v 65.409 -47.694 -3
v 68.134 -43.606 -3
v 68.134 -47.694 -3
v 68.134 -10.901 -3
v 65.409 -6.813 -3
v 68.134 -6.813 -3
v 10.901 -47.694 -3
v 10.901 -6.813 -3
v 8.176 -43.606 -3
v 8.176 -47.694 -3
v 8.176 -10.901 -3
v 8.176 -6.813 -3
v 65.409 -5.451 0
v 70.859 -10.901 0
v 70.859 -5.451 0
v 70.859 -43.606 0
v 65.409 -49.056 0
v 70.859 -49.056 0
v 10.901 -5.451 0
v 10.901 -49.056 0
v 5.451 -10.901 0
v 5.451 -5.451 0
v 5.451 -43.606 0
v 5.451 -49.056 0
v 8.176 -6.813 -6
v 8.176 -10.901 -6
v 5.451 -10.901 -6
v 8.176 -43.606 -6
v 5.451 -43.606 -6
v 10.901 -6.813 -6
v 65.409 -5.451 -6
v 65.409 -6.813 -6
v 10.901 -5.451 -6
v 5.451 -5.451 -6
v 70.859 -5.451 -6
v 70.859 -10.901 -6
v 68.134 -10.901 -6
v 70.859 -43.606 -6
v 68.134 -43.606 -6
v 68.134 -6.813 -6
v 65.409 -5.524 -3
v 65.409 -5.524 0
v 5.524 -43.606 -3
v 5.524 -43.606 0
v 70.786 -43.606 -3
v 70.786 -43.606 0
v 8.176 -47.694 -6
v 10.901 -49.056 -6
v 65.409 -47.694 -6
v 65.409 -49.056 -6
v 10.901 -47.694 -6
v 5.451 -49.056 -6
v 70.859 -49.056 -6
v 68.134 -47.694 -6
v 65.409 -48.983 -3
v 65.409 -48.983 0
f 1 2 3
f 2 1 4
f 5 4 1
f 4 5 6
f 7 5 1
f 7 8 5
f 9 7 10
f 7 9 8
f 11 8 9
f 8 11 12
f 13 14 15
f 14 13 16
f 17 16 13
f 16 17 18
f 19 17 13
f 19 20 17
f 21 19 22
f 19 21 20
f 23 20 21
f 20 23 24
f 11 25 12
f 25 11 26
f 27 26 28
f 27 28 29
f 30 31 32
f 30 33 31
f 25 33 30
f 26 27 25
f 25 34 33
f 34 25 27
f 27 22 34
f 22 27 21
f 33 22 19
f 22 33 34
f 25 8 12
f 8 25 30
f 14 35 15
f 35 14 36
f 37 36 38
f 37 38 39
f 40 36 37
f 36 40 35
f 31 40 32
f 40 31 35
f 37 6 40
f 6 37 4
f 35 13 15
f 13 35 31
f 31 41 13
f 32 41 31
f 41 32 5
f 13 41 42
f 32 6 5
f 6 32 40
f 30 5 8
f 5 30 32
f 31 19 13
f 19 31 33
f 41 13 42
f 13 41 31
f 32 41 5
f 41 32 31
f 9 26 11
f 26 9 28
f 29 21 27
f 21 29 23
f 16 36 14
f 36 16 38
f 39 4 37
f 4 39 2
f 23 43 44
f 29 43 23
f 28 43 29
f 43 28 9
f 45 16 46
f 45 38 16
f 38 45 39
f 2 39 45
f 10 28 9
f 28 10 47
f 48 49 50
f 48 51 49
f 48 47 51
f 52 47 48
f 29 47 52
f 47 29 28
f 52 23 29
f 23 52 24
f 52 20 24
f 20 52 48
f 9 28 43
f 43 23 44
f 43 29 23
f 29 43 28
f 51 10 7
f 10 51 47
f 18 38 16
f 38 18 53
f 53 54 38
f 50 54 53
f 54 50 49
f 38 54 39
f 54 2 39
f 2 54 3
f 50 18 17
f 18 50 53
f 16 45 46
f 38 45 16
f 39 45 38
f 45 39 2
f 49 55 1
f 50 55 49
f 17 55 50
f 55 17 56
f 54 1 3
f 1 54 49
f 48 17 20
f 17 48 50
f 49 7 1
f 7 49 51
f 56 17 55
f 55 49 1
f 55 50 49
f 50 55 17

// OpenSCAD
/*
PENTOMINO BLOCKS GENERATOR
==========================
(C) 2017 by Pascal Bauermeister.

(This is a part of the project "Pentomino Belt Buckle", focused on the
Pentomino pieces. It can however be used standalone. The other parts, not in this
file, include: frame, belt clip.)

This OpenSCAD script generates Pentomino blocks, with tabs and cavities to
allow them to hold together.

Being completely parametric allows individual control such as:
- size and thickness,
- tolerances (important for 3D printing), and also
- creating any kind of pieces, including 2D Polyminos of N cells for any N.

This is freeware. Enjoy and modify freely. You may kindly mention this project.
*/

IS_FRAME = true;
SCALE_FACTOR = IS_FRAME ? (60 - 1.3) / 60 : 1; // makes frame a bit smaller, compensating pentominos tolerance
//SCALE_FACTOR = IS_FRAME ? (60 - 1.8 + 0.5) / 60 : 1; // makes frame a bit smaller, compensating pentominos tolerance
echo("SCALE_FACTOR=", SCALE_FACTOR);

IS_INV = 1;

$fn = 24; // 24: high quality; 8: draft
//$fn = 8;
$fn = 16;

// BASE ETCHING
// this etches the first layer, to compensate for being wider due to being squished down
BASE_HEIGHT = 0.3;
BASE_TOLERANCE = 0.3;

// BLOCK
BLOCK_TOLERANCE = 0.15/2; // in mm
GRIP_TOLERANCE = 0.15/2; // in mm

BLOCK_SIDE = 6.5 *6/7;       // in mm
BLOCK_HEIGHT = 3;     // in mm
echo("BLOCK_SIDE=", BLOCK_SIDE);

DH = 0.1;
// GRIP
GRIP_RADIUS = BLOCK_HEIGHT/4 - GRIP_TOLERANCE; // in mm
GRIP_V_OFFSET = 0.2; //IS_INV ? 0.25 : -0.25;
//echo(GRIP_RADIUS*2);

// CAVITY
CAVITY_RADIUS = BLOCK_HEIGHT/4; // in mm
//echo(CAVITY_RADIUS*2);

// CHAMFER
SLICES = 5;
SLICE_THIKHNESS = 0.3/SLICES;
SLICE_RECESSION = 0.4/SLICES;

// MISC
ATOM = 0.0001; // a tiny value just to produce some offsets, making the 
               // results nicer in preview mode by cancelling effects of
               // boolean operations, but meant to not affect the end result
               // noticeably
_ = 0;

///////////////////////////////////////////////////////////////////////////////
// Bitmap defining the Pentomino shapes
GRID_P = [
    [_, _, _, _, _, _, _, _, _, _, _, _, _, _, _, _, _],
    [_, 1, 1, 1, 1, _, _, 1, _, 1, 1, 1, _, _, _, _, _],
    [_, _, _, 1, _, _, _, 1, _, 1, _, _, _, 1, _, _, _],
    [_, _, _, _, _, _, _, 1, _, 1, _, 1, 1, 1, _, _, _], 
    [_, 1, 1, _, _, _, _, 1, _, _, _, _, 1, _, _, 1, _],
    [_, 1, _, _, _, 1, _, 1, _, _, _, _, _, _, _, 1, _],
    [_, 1, _, 1, 1, 1, _, _, _, 1, _, _, _, _, 1, 1, _],
    [_, 1, _, 1, _, _, _, _, 1, 1, 1, _, _, _, 1, _, _],
    [_, _, _, _, _, _, _, _, _, 1, _, _, _, _, _, _, _],
    [_, _, _, 1, _, _, 1, _, _, _, _, _, _, _, 1, _, _],
    [_, _, 1, 1, _, _, 1, _, _, 1, _, 1, _, 1, 1, _, _],
    [_, 1, 1, _, _, 1, 1, 1, _, 1, 1, 1, _, 1, 1, _, _],
    [_, _, _, _, _, _, _, _, _, _, _, _, _, _, _, _, _],
];

// Rename as GRID_P to have a single block, for tests
GRID_P_ = [
    [_, _, _, _, _, _, _],
    [_, _, _, _, 1, _, _],
    [_, _, _, 1, 1, _, _],
    [_, 1, _, _, _, _, _],
    [_, 1, 1, _, _, _, _],
    [_, _, _, _, _, _, _],
];

GRID_F = [
    // grips+ cavities:
    // 2:none 3:north 4:south 5:east 6:west
    [_, _, _, _, _, _, _, _, _, _, _, _, _, _],
    [_, 9, 3, 3, 3, 3, 3, 3, 3, 3, 3, 3, 10, _],
    [_, 5, 1, 1, 1, 1, 1, 1, 1, 1, 1, 1, 6, _],
    [_, 5, 2, 2, 1, 2, 1, 1, 1, 1, 2, 2, 6, _],
    [_, 5, 1, 2, 1, 2, 1, 1, 1, 2, 2, 2, 6, _],
    [_, 5, 2, 2, 1, 2, 2, 1, 1, 1, 1, 1, 6, _],
    [_, 5, 2, 1, 1, 2, 2, 1, 1, 2, 2, 2, 6, _],
    [_, 5, 2, 2, 1, 1, 2, 1, 1, 2, 2, 2, 6, _],
    [_, 7, 4, 4, 4, 4, 4, 4, 4, 4, 4, 4, 8, _],
    [_, _, _, _, _, _, _, _, _, _, _, _, _, _],
];

GRID = IS_FRAME ? GRID_F : GRID_P;

///////////////////////////////////////////////////////////////////////////////
// Side-level primitives

/* Generate a grip for one give side (to be added) */
module make_grip_side(val, x, y, side) {
    convex = (side=="n") ? GRID[y+1][x-1] || GRID[y+1][x+1] :
             (side=="s") ? GRID[y-1][x-1] || GRID[y-1][x+1] :
             (side=="e") ? GRID[y+1][x+1] || GRID[y-1][x+1] :
           /*(side=="w")*/ GRID[y+1][x-1] || GRID[y-1][x-1];
    
    doit =  val==1
        || val==3 && side=="n"
        || val==4 && side=="s"
        || val==5 && side=="e"
        || val==6 && side=="w";

    if (doit && !convex) {
        center1 =
            (side=="n") ? [BLOCK_SIDE*.75, BLOCK_SIDE -BLOCK_TOLERANCE*2, 0] :
            (side=="s") ? [BLOCK_SIDE*.25,             BLOCK_TOLERANCE*2, 0] :
            (side=="e") ? [BLOCK_SIDE -BLOCK_TOLERANCE*2, BLOCK_SIDE*.25, 0] :
          /*(side=="w")*/ [            BLOCK_TOLERANCE*2, BLOCK_SIDE*.75, 0] ;
        color("yellow")
        translate([0, 0, BLOCK_HEIGHT*.25 +DH])
        translate(center1)
        sphere(r=GRIP_RADIUS);

        center2 =
            (side=="n") ? [BLOCK_SIDE*.25, BLOCK_SIDE -BLOCK_TOLERANCE*2, 0] :
            (side=="s") ? [BLOCK_SIDE*.75,             BLOCK_TOLERANCE*2, 0] :
            (side=="e") ? [BLOCK_SIDE -BLOCK_TOLERANCE*2, BLOCK_SIDE*.75, 0] :
          /*(side=="w")*/ [            BLOCK_TOLERANCE*2, BLOCK_SIDE*.25, 0] ;
        color("yellow")
        translate([0, 0, BLOCK_HEIGHT*.75 -DH])
        translate(center2)
        sphere(r=GRIP_RADIUS);
    }
}

/* Generate a cavity for one give side (to be substracted) */
module make_cavity_side(val, x, y, side) {
    // cavity for grip of neighbour piece

    doit =  val==1
        || val==3 && side=="n"
        || val==4 && side=="s"
        || val==5 && side=="e"
        || val==6 && side=="w";

    if (doit) {

        center1 = (side=="n") ? [BLOCK_SIDE*.25, BLOCK_SIDE -BLOCK_TOLERANCE*2, 0] :
                  (side=="s") ? [BLOCK_SIDE*.75,            +BLOCK_TOLERANCE*2, 0] :
                  (side=="e") ? [BLOCK_SIDE -BLOCK_TOLERANCE*2, BLOCK_SIDE*.75, 0] :
                /*(side=="w")*/ [           +BLOCK_TOLERANCE*2, BLOCK_SIDE*.25, 0];        
        color("orange")
        translate([0, 0, BLOCK_HEIGHT*.25 +DH])
        translate(center1)
        sphere(r=CAVITY_RADIUS);

        center2 = (side=="n") ? [BLOCK_SIDE*.75, BLOCK_SIDE -BLOCK_TOLERANCE*2, 0] :
                  (side=="s") ? [BLOCK_SIDE*.25,            +BLOCK_TOLERANCE*2, 0] :
                  (side=="e") ? [BLOCK_SIDE -BLOCK_TOLERANCE*2, BLOCK_SIDE*.25, 0] :
                /*(side=="w")*/ [           +BLOCK_TOLERANCE*2, BLOCK_SIDE*.75, 0];        
        color("orange")
        translate([0, 0, BLOCK_HEIGHT*.75 -DH])
        translate(center2)
        sphere(r=CAVITY_RADIUS);
    }
}

module make_border_side(val, x, y, side) {
    s2 = sqrt(2);
    
    if (val==5 || val==7 || val==9) {
        cube([BLOCK_SIDE/2, BLOCK_SIDE, BLOCK_HEIGHT*2]);            
    }
    else if (val==6 || val==8 || val==10) {
        translate([BLOCK_SIDE/2, 0, 0])
        cube([BLOCK_SIDE/2, BLOCK_SIDE, BLOCK_HEIGHT*2]);
    }    
    if (val==3 || val==9 || val==10) {
//        translate([0, -BLOCK_SIDE/2, 0])
        cube([BLOCK_SIDE, BLOCK_SIDE/4, BLOCK_HEIGHT*2]);
    }
    if (val==4 || val==7 || val==8) {
        translate([0, BLOCK_SIDE*3/4, 0])
        cube([BLOCK_SIDE, BLOCK_SIDE/4, BLOCK_HEIGHT*2]);
    }

//    // clip    
//    if (val==5) {
//        color("red")
//        translate([BLOCK_SIDE*.45, 0, BLOCK_HEIGHT*2])
//        rotate([0, 45+90, 0])
//        cube([BLOCK_SIDE/2 / s2, BLOCK_SIDE, BLOCK_SIDE/2 / s2]);
//    }
//    if (val==6) {
//        color("red")
//        translate([BLOCK_SIDE*.55, 0, BLOCK_HEIGHT*2])
//        rotate([0, 45+90, 0])
//        cube([BLOCK_SIDE/2 / s2, BLOCK_SIDE, BLOCK_SIDE/2 / s2]);
//    }

}

/* Generate an etching for one give side (to be substracted) */
module make_etch_side(x, y, side, etch) {
    center = (side=="n") ? [BLOCK_SIDE/2,   BLOCK_SIDE] :
             (side=="s") ? [BLOCK_SIDE/2,            0] :
             (side=="e") ? [  BLOCK_SIDE, BLOCK_SIDE/2] :
           /*(side=="w")*/ [           0, BLOCK_SIDE/2];

    // main etiching
    qsize = (side=="n") ? [BLOCK_SIDE + etch*2, etch*2] :
            (side=="s") ? [BLOCK_SIDE + etch*2, etch*2] :
            (side=="e") ? [etch*2, BLOCK_SIDE + etch*2] :
          /*(side=="w")*/ [etch*2, BLOCK_SIDE + etch*2];
    tx = center[0] - qsize[0]/2;
    ty = center[1] - qsize[1]/2;

    color("green")
    translate([tx, ty, -ATOM])
    cube([qsize[0], qsize[1], BLOCK_HEIGHT + ATOM*2]);
}

///////////////////////////////////////////////////////////////////////////////
// Block-level primitives

/* Generate a given grid block */
module make_block(x, y) {
    if (GRID[y][x]) {
        color(GRID[y][x]==2 ? "orange" : "black")
        translate([x*BLOCK_SIDE, y*BLOCK_SIDE, 0])
        cube([BLOCK_SIDE, BLOCK_SIDE, BLOCK_HEIGHT]);
    }
}

/* Generate etching for a given grid block (to be substracted) */
module make_etch(x, y, etch) {
    if (GRID[y][x]) {
        translate([x*BLOCK_SIDE, y*BLOCK_SIDE, 0]) {
            if (!GRID[y-1][x]) make_etch_side(x, y, "s", etch);
            if (!GRID[y+1][x]) make_etch_side(x, y, "n", etch);
            if (!GRID[y][x+1]) make_etch_side(x, y, "e", etch);
            if (!GRID[y][x-1]) make_etch_side(x, y, "w", etch);
        }
    }
}

/* Generate all grips for a given grid block (to be added) */
module make_grip(x, y) {
    val = GRID[y][x];
    if (val) {
        translate([x*BLOCK_SIDE, y*BLOCK_SIDE, 0]) {
            if (!GRID[y-1][x]) make_grip_side(val, x, y, "s");
            if (!GRID[y+1][x]) make_grip_side(val, x, y, "n");
            if (!GRID[y][x+1]) make_grip_side(val, x, y, "e");
            if (!GRID[y][x-1]) make_grip_side(val, x, y, "w");
        }
    }
}

/* Generate clips */
module make_border(x, y) {
    val = GRID[y][x];
    if (val) {
        color(GRID[y][x]==2 ? "orange" : "black")
        translate([x*BLOCK_SIDE, y*BLOCK_SIDE, 0]) {
            if (!GRID[y-1][x]) make_border_side(val, x, y, "s");
            if (!GRID[y+1][x]) make_border_side(val, x, y, "n");
            if (!GRID[y][x+1]) make_border_side(val, x, y, "e");
            if (!GRID[y][x-1]) make_border_side(val, x, y, "w");
        }
    }
}

/* Generate all cavities for a given grid block (to be substracted) */
module make_cavity(x, y) {
    val = GRID[y][x];
    if (val) {
        translate([x*BLOCK_SIDE, y*BLOCK_SIDE, 0]) {
            if (!GRID[y-1][x]) make_cavity_side(val, x, y, "s");
            if (!GRID[y+1][x]) make_cavity_side(val, x, y, "n");
            if (!GRID[y][x+1]) make_cavity_side(val, x, y, "e");
            if (!GRID[y][x-1]) make_cavity_side(val, x, y, "w");
                
//            translate([ 0.5 * BLOCK_SIDE, 0.5 * BLOCK_SIDE, BLOCK_HEIGHT*IS_INV])
//            sphere(r=CAVITY_RADIUS3);
        }
    }
}

///////////////////////////////////////////////////////////////////////////////
// Grid-level primitives

/* Generate all blocks of the grid */
module make_blocks() {
    union() { for (y = [0 : len(GRID)-1] ) for (x = [0 : len(GRID[y])-1] ) make_block(x, y); }
}

/* Generate all etchings of the grid */
module make_etches(etch) {
    union() { for (y = [0 : len(GRID)-1] ) for (x = [0 : len(GRID[y])-1] ) make_etch(x, y, etch); }
}

/* Generate all grips of the grid */
module make_grips() {
    union() { for (y = [0 : len(GRID)-1] ) for (x = [0 : len(GRID[y])-1] ) make_grip(x, y); }
}

/* Generate clips */
module make_borders() {
    union() { for (y = [0 : len(GRID)-1] ) for (x = [0 : len(GRID[y])-1] ) make_border(x, y); }
}

/* Generate all cavities of the grid */
module make_cavities() {
    union() { for (y = [0 : len(GRID)-1] ) for (x = [0 : len(GRID[y])-1] ) make_cavity(x, y); }
}

///////////////////////////////////////////////////////////////////////////////
// Everything together

module make_chamfer_slice(i) {
    difference() {
        resize([0, 0, SLICE_THIKHNESS], auto=[false,false,true]) 
        make_blocks();
        make_etches(BLOCK_TOLERANCE + (i+1)*SLICE_RECESSION);
    }
}

module make_chamfer() {
    for (i=[0:SLICES]) {
        translate([0,0,BLOCK_HEIGHT + i*SLICE_THIKHNESS])
        make_chamfer_slice(i);

        translate([0,0, -(i+1)*SLICE_THIKHNESS])
        make_chamfer_slice(i);
    }
}


/* Generate all objects by combining additive and substractive elements */
module make_all() {
    difference()
    {
        union() {
            //union() {
            difference() {
                make_blocks();
                make_etches(BLOCK_TOLERANCE);
            }
            make_grips();
            make_borders();
//            make_chamfer();
        }
        make_cavities();
    }
}

/* Go for it and fix orientation */
scale([SCALE_FACTOR, SCALE_FACTOR, 1])
rotate([0, 180*1, 180*1]) {
    make_all();
}


// End
